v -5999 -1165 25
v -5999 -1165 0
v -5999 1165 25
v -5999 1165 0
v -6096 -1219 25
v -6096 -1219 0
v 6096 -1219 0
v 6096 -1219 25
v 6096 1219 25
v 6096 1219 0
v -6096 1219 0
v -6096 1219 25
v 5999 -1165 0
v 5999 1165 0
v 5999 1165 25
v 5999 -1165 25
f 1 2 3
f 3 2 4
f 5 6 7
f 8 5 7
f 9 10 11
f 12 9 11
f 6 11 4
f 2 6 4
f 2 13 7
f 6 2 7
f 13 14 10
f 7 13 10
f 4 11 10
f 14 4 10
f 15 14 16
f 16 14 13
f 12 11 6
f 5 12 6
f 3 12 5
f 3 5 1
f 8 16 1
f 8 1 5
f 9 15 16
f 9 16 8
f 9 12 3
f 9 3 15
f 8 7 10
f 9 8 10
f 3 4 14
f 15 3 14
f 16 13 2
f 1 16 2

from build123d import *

# Parameters (mm, degrees)
F0_W     = 97
F0_H     = 2286
F1_DEPTH = 25


with BuildPart() as f1:
    # F0 (on Top) → F1 (new body)
    with BuildSketch(Plane.XY):
        with Locations((-6047.5, 0)):
            Rectangle(F0_W, F0_H)
        Polygon((-5999, 1165), (5999, 1165), (5999, -1165), (-5999, -1165), (-5999, -1143), (-6096, -1143), (-6096, -1219), (6096, -1219), (6096, 1219), (-6096, 1219), (-6096, 1143), (-5999, 1143), align=None)
    extrude(amount=F1_DEPTH)


solid = f1.part
